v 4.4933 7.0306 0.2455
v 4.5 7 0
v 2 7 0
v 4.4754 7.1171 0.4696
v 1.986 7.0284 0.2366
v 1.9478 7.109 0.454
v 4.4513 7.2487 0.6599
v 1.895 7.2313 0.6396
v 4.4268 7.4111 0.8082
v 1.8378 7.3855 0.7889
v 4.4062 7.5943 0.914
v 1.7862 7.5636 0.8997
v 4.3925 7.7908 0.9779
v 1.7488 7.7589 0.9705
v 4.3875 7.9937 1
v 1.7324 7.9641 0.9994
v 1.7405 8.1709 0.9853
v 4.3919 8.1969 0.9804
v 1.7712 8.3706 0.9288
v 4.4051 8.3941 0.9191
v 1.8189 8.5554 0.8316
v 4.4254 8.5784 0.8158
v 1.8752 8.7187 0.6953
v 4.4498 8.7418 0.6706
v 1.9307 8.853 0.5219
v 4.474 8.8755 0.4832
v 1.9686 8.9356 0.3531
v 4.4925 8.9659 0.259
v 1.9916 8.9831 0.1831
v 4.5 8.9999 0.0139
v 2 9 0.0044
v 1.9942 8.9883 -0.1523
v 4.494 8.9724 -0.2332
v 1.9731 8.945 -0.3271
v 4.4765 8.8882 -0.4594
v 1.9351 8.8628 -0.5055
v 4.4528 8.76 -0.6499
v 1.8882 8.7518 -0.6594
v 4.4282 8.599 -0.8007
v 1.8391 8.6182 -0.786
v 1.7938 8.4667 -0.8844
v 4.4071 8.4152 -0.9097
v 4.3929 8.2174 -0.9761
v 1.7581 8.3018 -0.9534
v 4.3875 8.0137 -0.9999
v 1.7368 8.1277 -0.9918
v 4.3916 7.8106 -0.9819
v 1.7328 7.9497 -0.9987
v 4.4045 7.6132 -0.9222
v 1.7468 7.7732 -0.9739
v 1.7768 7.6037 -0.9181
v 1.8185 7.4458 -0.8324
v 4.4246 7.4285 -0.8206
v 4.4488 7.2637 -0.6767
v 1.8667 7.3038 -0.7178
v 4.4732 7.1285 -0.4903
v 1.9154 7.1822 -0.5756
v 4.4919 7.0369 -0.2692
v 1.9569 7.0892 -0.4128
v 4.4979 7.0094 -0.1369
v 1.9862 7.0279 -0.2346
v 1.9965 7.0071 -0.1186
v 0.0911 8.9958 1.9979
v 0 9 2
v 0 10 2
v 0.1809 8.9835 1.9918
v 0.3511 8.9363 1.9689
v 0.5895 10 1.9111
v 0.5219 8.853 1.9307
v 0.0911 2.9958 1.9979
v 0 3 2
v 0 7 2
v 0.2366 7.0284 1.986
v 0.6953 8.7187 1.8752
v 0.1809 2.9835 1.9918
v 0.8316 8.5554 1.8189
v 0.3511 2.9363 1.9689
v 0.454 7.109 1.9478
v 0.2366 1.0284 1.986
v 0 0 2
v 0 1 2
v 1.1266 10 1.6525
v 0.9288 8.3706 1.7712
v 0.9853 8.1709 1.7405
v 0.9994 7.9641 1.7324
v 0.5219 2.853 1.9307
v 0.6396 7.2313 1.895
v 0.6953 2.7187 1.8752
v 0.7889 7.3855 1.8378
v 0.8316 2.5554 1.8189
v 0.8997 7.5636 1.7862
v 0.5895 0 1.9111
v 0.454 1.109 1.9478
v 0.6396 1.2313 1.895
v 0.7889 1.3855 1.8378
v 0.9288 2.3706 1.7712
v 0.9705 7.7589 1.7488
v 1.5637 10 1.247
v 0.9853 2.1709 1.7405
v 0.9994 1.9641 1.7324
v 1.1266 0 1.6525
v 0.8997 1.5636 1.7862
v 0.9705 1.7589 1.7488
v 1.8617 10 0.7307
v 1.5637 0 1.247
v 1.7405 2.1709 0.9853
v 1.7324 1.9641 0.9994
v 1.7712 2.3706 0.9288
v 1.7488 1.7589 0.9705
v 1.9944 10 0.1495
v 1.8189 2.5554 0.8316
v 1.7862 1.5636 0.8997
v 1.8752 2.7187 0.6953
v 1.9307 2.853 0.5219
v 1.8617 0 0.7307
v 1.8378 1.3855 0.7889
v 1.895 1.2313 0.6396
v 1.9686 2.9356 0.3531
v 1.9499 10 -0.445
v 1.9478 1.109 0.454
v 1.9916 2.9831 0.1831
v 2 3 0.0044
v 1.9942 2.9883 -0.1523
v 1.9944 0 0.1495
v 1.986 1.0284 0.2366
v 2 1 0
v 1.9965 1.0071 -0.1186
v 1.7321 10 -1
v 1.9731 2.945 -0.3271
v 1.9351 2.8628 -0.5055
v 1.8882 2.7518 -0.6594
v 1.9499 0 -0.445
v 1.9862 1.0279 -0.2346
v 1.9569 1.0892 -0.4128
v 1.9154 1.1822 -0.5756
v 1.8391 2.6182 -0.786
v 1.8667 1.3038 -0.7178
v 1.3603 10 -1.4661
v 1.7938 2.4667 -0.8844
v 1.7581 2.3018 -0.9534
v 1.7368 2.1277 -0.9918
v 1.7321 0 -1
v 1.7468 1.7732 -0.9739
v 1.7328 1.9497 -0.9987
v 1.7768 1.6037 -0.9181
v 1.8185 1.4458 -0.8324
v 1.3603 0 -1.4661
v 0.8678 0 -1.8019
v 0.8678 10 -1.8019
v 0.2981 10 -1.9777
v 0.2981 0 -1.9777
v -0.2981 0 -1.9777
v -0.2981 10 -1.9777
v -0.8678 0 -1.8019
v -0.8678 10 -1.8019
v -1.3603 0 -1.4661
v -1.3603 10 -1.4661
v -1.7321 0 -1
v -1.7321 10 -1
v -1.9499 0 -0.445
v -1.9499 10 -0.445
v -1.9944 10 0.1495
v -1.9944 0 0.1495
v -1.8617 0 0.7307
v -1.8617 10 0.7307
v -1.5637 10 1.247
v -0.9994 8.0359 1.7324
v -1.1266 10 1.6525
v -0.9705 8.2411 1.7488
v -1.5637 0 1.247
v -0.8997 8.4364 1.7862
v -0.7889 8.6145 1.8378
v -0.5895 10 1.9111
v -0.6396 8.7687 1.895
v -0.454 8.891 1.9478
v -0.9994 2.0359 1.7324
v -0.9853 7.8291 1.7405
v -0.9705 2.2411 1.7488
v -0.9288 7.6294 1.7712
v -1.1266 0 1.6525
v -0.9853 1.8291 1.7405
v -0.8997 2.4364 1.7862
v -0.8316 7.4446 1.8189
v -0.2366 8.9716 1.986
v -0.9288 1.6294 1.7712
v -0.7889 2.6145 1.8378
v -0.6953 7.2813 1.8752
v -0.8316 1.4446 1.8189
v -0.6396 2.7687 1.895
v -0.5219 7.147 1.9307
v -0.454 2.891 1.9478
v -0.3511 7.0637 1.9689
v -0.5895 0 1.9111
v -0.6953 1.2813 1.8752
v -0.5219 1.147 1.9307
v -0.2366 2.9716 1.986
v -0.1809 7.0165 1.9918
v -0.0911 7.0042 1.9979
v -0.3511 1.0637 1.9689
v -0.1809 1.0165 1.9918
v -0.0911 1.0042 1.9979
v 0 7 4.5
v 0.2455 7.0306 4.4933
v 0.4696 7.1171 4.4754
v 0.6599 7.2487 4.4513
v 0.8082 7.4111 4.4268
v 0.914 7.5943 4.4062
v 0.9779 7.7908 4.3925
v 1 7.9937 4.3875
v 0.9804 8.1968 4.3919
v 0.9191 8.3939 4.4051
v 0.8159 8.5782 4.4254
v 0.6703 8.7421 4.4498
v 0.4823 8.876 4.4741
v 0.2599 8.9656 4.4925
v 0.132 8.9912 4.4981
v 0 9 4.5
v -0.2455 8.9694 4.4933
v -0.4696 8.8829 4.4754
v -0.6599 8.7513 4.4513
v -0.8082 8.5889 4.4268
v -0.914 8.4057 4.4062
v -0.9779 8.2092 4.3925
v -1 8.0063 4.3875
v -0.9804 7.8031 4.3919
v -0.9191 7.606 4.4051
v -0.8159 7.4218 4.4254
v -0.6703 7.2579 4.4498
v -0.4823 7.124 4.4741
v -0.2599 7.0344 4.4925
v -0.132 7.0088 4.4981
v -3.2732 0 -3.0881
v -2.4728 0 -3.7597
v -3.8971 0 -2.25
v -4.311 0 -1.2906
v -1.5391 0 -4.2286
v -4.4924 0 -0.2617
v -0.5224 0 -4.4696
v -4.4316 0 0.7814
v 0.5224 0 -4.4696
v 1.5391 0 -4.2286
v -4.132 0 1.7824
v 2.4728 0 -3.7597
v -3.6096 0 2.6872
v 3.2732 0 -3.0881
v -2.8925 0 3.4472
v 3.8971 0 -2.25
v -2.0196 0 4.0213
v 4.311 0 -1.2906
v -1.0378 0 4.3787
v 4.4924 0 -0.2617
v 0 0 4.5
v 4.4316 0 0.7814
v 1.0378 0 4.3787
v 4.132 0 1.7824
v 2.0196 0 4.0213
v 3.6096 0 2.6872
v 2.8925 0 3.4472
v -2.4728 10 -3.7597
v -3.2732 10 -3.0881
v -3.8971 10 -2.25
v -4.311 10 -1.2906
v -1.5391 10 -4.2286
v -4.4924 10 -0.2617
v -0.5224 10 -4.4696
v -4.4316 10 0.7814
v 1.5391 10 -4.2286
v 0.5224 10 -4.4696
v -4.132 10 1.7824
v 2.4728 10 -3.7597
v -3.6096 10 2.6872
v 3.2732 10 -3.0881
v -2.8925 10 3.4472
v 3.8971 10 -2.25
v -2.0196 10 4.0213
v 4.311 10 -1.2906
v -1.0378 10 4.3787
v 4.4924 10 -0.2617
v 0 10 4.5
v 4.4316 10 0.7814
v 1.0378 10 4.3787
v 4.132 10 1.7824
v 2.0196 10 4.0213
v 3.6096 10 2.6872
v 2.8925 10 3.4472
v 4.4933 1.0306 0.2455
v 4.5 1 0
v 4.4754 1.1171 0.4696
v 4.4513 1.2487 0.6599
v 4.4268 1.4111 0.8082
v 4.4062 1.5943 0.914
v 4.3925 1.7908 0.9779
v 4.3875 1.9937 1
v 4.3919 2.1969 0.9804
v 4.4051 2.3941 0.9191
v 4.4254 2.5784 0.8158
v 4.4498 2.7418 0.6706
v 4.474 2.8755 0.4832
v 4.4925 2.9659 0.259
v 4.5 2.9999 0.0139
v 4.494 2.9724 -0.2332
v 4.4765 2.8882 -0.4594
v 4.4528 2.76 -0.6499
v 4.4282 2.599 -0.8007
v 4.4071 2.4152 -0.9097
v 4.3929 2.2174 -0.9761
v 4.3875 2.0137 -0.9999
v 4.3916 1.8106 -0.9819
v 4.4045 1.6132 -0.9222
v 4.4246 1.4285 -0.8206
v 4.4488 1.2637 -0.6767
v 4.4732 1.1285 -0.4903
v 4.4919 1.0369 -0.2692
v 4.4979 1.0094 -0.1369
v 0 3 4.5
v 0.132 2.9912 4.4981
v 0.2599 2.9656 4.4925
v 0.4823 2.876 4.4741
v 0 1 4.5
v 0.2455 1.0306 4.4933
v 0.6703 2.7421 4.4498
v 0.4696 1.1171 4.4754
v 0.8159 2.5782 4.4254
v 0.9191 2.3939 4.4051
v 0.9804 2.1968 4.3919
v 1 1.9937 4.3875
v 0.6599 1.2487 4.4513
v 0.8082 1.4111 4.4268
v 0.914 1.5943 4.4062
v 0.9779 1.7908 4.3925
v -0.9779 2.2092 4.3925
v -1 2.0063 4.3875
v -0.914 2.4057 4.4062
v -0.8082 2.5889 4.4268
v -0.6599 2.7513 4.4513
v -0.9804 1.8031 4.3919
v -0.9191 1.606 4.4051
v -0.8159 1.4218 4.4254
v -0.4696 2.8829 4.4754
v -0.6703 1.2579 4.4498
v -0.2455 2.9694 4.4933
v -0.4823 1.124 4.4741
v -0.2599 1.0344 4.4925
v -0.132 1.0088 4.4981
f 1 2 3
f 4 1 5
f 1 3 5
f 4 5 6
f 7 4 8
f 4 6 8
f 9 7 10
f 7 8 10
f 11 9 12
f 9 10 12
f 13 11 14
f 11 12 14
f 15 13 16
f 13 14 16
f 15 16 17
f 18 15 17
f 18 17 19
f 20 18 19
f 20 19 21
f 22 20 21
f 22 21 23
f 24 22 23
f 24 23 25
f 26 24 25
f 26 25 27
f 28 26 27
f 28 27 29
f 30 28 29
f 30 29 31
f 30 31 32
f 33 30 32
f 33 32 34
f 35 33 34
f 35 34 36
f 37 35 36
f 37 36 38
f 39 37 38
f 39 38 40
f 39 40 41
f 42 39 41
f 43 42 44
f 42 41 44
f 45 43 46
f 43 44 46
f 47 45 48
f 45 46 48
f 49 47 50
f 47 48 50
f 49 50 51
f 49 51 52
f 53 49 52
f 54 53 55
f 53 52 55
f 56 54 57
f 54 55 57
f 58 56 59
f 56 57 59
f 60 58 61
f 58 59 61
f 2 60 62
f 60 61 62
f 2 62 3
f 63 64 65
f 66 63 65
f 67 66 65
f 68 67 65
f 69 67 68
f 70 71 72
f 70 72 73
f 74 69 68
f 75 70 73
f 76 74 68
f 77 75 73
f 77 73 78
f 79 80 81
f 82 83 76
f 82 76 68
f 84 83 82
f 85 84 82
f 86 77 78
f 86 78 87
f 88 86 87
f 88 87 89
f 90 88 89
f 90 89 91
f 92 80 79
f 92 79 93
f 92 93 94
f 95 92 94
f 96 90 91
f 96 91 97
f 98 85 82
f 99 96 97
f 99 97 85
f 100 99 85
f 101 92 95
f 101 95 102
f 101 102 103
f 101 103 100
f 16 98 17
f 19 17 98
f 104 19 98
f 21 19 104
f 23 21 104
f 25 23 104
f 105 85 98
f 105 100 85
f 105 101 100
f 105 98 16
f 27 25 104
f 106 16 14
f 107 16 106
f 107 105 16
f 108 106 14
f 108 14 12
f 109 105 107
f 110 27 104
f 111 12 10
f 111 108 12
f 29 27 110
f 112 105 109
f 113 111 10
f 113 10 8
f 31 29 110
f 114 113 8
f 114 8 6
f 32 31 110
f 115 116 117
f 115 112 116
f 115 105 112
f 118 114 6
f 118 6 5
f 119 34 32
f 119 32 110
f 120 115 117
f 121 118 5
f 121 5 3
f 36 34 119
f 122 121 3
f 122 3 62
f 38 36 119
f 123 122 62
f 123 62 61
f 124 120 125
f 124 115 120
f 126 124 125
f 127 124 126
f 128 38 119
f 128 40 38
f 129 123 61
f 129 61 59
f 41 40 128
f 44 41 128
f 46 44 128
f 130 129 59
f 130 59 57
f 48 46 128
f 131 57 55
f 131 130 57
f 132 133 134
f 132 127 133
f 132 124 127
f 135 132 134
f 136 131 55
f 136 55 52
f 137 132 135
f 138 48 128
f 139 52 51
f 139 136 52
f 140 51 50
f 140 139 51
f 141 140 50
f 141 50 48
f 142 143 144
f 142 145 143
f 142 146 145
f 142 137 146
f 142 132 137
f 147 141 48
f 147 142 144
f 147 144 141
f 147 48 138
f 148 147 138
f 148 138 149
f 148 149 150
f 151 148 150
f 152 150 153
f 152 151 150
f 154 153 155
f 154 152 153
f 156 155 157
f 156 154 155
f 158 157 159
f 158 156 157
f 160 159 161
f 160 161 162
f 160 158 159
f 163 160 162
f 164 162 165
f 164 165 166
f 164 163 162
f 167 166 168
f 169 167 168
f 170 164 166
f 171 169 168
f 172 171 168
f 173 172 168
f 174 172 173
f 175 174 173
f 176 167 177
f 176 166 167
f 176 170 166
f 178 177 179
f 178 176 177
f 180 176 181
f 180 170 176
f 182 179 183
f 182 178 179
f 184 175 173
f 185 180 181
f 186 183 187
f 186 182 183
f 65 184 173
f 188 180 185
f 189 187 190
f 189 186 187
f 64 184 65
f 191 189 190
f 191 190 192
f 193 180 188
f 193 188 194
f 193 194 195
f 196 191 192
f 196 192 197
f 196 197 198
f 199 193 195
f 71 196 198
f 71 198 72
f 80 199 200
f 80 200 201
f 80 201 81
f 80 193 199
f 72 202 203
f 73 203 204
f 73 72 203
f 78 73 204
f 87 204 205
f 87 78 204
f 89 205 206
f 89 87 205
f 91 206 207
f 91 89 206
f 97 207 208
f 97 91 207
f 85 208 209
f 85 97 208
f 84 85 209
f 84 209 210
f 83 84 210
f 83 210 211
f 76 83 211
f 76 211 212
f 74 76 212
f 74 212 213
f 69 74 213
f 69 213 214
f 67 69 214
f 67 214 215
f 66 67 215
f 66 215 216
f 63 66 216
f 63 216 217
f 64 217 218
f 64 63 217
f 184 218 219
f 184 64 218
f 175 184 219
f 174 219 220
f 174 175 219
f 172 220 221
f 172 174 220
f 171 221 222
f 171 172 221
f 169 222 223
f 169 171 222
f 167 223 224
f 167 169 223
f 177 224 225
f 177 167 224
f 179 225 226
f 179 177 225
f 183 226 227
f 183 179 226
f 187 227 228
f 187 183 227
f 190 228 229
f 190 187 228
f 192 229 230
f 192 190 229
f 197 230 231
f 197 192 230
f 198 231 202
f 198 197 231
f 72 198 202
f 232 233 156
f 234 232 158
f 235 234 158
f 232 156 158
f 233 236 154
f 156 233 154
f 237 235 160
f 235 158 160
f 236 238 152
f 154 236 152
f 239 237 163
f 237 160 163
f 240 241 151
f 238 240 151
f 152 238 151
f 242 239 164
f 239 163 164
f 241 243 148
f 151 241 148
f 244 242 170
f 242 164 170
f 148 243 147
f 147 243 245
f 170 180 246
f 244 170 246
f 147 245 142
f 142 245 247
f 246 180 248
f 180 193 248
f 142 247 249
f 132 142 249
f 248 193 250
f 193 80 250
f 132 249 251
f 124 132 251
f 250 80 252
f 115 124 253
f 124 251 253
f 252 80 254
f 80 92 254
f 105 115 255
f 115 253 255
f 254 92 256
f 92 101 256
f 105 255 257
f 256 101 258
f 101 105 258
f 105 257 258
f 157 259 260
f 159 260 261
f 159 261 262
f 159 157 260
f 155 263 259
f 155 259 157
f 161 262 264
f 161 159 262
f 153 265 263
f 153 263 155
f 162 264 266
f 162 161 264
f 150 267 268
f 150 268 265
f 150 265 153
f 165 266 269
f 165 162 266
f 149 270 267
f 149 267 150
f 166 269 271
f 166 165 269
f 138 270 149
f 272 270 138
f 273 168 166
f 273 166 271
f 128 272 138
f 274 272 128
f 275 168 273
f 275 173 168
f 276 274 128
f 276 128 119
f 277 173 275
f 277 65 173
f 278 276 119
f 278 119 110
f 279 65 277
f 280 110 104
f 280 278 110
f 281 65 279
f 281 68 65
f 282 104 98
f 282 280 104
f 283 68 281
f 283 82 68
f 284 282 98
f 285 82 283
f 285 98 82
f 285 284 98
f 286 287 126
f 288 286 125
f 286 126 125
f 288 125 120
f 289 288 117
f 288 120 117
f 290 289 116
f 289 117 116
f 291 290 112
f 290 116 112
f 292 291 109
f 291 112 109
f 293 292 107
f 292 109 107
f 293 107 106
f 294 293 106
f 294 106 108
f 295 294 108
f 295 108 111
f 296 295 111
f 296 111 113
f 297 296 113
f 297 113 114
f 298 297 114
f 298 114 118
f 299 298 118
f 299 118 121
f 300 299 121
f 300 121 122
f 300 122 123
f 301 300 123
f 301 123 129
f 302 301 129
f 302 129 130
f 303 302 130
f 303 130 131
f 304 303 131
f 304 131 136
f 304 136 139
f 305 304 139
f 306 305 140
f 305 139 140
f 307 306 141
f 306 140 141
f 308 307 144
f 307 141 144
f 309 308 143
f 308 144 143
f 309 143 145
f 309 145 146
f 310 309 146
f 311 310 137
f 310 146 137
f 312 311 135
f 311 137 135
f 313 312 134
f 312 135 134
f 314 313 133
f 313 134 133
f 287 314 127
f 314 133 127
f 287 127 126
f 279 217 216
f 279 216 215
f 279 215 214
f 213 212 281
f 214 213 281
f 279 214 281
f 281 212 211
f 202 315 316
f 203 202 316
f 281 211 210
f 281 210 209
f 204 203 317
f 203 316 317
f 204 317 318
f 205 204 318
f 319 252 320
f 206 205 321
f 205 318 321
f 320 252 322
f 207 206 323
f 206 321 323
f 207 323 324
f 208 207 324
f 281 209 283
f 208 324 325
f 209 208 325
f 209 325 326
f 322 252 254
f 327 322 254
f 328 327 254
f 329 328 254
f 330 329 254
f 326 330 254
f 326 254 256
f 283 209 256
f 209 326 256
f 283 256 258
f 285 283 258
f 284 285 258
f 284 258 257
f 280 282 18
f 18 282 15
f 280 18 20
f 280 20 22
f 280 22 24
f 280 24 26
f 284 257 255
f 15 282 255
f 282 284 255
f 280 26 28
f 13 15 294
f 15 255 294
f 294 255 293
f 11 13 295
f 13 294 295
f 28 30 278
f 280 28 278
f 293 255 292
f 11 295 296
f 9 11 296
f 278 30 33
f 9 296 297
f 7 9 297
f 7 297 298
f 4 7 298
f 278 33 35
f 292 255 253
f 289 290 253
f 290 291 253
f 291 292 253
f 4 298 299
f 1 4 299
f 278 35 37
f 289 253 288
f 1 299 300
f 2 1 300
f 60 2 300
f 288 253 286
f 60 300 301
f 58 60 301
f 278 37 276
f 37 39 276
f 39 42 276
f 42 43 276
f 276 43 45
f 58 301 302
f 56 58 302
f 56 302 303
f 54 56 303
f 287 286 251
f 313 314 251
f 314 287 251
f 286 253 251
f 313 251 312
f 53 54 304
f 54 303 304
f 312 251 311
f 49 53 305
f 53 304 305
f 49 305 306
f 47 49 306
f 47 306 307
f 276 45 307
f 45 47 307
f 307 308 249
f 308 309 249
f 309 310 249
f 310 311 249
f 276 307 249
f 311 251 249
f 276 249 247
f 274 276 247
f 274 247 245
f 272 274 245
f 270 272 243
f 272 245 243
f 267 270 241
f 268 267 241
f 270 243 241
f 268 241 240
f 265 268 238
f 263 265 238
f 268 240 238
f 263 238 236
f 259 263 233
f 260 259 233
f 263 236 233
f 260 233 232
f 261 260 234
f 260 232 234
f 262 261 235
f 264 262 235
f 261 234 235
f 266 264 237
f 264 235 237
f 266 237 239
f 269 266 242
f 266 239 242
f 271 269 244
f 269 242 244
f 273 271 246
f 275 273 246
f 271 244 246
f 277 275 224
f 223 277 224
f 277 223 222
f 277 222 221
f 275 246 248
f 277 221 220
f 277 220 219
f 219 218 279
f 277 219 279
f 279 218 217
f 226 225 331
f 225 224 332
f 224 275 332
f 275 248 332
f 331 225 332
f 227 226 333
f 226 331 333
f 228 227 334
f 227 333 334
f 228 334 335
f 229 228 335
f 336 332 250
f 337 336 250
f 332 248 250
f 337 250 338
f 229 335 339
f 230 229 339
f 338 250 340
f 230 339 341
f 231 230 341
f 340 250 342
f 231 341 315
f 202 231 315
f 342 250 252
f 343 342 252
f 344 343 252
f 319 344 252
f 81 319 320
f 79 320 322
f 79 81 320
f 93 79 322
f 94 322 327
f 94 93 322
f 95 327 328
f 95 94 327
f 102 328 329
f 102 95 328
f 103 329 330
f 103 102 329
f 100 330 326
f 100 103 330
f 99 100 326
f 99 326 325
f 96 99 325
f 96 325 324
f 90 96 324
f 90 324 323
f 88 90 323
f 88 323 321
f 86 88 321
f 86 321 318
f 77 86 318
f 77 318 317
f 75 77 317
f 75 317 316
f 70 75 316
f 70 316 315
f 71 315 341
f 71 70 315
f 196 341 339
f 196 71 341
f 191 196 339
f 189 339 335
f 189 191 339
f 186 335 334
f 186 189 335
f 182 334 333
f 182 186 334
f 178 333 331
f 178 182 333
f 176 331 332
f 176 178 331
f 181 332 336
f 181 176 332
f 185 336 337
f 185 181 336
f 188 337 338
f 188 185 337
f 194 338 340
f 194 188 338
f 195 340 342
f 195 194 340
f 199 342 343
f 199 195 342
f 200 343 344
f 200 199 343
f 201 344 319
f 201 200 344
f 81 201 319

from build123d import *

# Parameters (mm, degrees)
SKETCH1_R           = 4.5
SKETCH1_R_2         = 2
BOSS_EXTRUDE1_DEPTH = 10
SKETCH2_R           = 1
CUT_EXTRUDE1_DEPTH  = 12.853269591


with BuildPart() as part:
    # Sketch1 → Boss-Extrude1 (new body)
    with BuildSketch(Plane(origin=(0, 0, 0), x_dir=(1, 0, 0), z_dir=(0, 1, 0))):
        Circle(SKETCH1_R)
        Circle(SKETCH1_R_2, mode=Mode.SUBTRACT)
    extrude(amount=BOSS_EXTRUDE1_DEPTH)

    # Sketch2 → Cut-Extrude1 (cut, through all)
    with BuildSketch(Plane.XY):
        with Locations((0, 8)):
            Circle(SKETCH2_R)
        with Locations((0, 2)):
            Circle(SKETCH2_R)
    cut_extrude1 = extrude(amount=CUT_EXTRUDE1_DEPTH, mode=Mode.SUBTRACT)

    # Mirror1: Cut-Extrude1 across plane
    add(cut_extrude1.mirror(Plane(origin=(0, 0, 0), x_dir=(0.7071067811865465, 0, 0.7071067811865486), z_dir=(-0.7071067811865488, 0, 0.7071067811865464))), mode=Mode.SUBTRACT)


solid = part.part
